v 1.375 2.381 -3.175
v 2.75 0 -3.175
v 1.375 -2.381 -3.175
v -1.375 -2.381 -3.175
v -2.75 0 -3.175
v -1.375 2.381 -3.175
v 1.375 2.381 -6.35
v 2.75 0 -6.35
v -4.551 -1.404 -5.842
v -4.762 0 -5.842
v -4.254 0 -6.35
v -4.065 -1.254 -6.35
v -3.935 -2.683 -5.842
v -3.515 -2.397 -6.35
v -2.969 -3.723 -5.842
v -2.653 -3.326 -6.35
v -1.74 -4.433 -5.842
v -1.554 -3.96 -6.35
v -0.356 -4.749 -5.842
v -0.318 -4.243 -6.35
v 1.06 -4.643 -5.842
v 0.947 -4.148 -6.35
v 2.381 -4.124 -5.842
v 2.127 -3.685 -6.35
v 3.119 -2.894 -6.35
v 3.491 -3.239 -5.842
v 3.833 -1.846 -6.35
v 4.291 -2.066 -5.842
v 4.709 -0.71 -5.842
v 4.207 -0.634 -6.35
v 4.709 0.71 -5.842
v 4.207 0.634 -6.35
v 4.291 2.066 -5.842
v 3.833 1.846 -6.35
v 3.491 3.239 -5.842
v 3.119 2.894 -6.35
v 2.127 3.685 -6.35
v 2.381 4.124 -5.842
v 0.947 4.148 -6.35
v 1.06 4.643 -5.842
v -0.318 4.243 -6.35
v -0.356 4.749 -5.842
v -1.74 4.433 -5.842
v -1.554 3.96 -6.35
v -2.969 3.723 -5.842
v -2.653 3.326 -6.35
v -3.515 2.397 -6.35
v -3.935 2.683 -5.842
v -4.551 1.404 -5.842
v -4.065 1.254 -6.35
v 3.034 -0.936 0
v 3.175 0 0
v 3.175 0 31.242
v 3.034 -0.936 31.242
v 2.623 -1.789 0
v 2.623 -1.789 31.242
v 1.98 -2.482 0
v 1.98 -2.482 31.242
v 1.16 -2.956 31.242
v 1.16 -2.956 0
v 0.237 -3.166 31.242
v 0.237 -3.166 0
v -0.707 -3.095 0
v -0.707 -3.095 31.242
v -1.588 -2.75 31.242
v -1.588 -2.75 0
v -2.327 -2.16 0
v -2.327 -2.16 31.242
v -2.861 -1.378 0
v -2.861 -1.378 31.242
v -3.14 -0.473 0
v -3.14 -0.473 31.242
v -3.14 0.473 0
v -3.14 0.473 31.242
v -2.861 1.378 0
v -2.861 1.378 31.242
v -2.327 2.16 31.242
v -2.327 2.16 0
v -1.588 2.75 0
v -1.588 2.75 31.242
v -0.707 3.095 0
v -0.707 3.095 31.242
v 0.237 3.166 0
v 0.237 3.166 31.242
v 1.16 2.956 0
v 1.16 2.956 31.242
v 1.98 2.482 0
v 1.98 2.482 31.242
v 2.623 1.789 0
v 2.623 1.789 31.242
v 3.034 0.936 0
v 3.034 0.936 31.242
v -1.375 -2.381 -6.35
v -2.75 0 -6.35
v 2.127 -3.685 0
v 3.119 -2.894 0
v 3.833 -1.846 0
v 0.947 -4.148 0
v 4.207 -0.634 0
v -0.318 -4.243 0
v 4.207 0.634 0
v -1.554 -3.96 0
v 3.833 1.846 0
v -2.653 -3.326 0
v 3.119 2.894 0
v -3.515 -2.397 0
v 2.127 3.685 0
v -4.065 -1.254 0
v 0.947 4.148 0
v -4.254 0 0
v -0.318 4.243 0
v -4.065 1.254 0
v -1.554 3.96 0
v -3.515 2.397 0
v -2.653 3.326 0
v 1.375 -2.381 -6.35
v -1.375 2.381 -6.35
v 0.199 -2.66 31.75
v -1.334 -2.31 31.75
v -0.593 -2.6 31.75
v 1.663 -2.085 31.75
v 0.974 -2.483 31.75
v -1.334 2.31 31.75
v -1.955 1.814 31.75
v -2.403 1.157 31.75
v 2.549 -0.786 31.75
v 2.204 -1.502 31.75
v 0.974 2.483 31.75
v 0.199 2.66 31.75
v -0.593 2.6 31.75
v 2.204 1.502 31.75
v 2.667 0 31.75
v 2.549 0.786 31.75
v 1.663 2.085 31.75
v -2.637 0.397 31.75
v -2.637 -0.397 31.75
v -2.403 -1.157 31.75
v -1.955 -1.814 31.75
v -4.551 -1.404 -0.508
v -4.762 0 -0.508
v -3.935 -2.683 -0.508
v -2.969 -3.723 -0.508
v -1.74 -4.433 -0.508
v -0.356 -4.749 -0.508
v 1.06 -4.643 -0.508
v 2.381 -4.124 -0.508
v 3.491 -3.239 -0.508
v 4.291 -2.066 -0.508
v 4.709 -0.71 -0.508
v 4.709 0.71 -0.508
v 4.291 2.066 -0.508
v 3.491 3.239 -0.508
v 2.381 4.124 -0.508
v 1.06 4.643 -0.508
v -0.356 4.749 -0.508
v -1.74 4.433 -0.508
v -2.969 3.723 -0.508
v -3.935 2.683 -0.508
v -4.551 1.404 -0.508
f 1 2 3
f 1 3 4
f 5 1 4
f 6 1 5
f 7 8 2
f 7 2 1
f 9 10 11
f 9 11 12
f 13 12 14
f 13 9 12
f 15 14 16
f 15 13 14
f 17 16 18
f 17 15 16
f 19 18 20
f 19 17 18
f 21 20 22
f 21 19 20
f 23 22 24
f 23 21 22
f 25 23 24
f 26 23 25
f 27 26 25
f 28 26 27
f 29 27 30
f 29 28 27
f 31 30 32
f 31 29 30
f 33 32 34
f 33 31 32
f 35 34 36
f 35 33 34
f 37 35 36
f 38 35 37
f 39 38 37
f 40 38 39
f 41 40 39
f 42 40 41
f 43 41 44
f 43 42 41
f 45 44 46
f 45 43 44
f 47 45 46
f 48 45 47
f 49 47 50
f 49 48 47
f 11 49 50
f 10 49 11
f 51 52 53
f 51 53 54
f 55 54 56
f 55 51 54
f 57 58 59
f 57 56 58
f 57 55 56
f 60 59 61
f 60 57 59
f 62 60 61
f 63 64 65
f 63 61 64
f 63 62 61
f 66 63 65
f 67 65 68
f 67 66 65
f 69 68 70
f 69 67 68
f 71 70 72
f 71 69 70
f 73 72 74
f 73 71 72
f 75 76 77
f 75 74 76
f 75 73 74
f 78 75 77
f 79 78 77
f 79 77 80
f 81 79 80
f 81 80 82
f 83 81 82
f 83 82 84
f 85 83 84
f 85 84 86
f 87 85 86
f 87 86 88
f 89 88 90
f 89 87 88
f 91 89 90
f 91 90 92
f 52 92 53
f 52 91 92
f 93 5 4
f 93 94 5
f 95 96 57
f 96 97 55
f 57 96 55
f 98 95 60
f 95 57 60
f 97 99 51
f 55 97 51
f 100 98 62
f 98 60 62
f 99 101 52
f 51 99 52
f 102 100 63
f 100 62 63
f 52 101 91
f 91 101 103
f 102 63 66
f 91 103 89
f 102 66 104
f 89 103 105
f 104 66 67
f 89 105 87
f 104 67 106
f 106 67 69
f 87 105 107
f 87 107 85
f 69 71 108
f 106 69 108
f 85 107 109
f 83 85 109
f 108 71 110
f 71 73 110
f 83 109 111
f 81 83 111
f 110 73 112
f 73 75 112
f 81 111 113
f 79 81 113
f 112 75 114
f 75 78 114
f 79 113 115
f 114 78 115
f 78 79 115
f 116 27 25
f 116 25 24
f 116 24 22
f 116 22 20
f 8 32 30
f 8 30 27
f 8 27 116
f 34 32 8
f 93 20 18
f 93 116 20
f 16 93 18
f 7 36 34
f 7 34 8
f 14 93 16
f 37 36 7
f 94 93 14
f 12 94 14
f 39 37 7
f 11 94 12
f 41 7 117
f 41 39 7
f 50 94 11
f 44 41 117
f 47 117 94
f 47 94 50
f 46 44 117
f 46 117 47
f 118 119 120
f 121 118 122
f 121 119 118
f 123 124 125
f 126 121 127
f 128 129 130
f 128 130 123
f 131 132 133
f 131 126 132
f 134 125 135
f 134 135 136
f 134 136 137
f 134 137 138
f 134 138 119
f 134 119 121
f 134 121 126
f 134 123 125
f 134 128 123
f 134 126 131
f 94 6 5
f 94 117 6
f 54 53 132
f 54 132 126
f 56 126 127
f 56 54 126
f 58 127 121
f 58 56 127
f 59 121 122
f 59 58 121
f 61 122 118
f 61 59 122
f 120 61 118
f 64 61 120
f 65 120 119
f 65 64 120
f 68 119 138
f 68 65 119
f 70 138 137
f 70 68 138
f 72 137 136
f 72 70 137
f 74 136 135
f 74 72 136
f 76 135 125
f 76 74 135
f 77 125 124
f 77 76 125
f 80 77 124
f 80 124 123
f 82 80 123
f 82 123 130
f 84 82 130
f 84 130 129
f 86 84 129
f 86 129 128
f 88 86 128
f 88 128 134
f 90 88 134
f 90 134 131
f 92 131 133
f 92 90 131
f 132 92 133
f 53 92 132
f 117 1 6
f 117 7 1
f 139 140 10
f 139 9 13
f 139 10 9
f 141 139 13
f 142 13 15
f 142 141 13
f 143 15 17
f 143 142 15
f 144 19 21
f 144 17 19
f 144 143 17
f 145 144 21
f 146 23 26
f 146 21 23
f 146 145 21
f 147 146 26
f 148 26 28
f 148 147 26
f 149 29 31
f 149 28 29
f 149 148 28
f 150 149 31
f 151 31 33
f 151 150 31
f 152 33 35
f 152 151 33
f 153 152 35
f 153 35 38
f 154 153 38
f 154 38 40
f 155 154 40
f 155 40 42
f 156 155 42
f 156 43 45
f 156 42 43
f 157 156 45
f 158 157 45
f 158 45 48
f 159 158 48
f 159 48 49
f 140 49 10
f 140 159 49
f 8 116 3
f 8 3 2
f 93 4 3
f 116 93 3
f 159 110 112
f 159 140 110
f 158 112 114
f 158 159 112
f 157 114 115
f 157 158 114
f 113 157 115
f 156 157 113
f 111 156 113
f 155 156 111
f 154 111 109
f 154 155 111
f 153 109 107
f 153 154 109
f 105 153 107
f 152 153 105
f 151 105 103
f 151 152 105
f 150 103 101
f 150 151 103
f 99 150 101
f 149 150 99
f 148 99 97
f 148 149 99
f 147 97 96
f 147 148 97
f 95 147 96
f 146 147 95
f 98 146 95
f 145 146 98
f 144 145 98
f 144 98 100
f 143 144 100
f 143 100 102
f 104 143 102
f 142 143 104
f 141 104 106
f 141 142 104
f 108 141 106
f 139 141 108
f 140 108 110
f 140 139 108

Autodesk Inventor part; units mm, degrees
ref_plane "YZ Plane" through (0, 0, 0) normal (1, 0, 0) x (0, 1, 0)
ref_plane "XZ Plane" through (0, 0, 0) normal (0, 1, 0) x (-1, 0, 0)
ref_plane "XY Plane" through (0, 0, 0) normal (0, 0, 1) x (1, 0, 0)
sketch "Sketch1" plane through (0, 0, 0) normal (0, 0, 1) x (1, 0, 0)
  circle A0 centre (0, 0) radius 3.175
  dimension "d0" = 6.35
extrude "Extrusion1" add sketch "Sketch1" along normal blind 31.75
sketch "Sketch2" plane through (0, 0, 0) normal (0, 0, -1) x (-1, 0, 0)
  circle A0 centre (0, 0) radius 3.175 projected
  circle A1 centre (0, 0) radius 4.7625
  dimension "d3" = 9.525
extrude "Extrusion2" add sketch "Sketch2" along normal blind 6.35 contours A0 | A1
sketch "Sketch3" plane through (0, 0, -6.35) normal (0, 0, -1) x (-1, 0, 0)
  circle A0 centre (0, 0) radius 4.7625 projected
  line L0 (-1.3748, 2.3812) -> (1.3748, 2.3813)
  line L1 (1.3748, 2.3813) -> (2.7496, 0)
  line L2 (2.7496, 0) -> (1.3748, -2.3812)
  line L3 (1.3748, -2.3812) -> (-1.3748, -2.3812)
  line L4 (-1.3748, -2.3812) -> (-2.7496, 0)
  line L5 (-2.7496, 0) -> (-1.3748, 2.3812)
  dimension "d6" = 4.7625
extrude "Extrusion3" cut sketch "Sketch3" against normal blind 3.175 contours L0 L1 L2 L3 L4 L5
chamfer "Chamfer1" distance 0.508 angle 45 3 edges at (-3.175, 0, 31.75) (4.7625, 0, 0) (4.7625, 0, -6.35)
thread "Thread1" size "1/4-20 UNC" class "2A" standard "ANSI Unified Screw Threads" length 25.4
properties part number "14-20 x750" material "Steel"
